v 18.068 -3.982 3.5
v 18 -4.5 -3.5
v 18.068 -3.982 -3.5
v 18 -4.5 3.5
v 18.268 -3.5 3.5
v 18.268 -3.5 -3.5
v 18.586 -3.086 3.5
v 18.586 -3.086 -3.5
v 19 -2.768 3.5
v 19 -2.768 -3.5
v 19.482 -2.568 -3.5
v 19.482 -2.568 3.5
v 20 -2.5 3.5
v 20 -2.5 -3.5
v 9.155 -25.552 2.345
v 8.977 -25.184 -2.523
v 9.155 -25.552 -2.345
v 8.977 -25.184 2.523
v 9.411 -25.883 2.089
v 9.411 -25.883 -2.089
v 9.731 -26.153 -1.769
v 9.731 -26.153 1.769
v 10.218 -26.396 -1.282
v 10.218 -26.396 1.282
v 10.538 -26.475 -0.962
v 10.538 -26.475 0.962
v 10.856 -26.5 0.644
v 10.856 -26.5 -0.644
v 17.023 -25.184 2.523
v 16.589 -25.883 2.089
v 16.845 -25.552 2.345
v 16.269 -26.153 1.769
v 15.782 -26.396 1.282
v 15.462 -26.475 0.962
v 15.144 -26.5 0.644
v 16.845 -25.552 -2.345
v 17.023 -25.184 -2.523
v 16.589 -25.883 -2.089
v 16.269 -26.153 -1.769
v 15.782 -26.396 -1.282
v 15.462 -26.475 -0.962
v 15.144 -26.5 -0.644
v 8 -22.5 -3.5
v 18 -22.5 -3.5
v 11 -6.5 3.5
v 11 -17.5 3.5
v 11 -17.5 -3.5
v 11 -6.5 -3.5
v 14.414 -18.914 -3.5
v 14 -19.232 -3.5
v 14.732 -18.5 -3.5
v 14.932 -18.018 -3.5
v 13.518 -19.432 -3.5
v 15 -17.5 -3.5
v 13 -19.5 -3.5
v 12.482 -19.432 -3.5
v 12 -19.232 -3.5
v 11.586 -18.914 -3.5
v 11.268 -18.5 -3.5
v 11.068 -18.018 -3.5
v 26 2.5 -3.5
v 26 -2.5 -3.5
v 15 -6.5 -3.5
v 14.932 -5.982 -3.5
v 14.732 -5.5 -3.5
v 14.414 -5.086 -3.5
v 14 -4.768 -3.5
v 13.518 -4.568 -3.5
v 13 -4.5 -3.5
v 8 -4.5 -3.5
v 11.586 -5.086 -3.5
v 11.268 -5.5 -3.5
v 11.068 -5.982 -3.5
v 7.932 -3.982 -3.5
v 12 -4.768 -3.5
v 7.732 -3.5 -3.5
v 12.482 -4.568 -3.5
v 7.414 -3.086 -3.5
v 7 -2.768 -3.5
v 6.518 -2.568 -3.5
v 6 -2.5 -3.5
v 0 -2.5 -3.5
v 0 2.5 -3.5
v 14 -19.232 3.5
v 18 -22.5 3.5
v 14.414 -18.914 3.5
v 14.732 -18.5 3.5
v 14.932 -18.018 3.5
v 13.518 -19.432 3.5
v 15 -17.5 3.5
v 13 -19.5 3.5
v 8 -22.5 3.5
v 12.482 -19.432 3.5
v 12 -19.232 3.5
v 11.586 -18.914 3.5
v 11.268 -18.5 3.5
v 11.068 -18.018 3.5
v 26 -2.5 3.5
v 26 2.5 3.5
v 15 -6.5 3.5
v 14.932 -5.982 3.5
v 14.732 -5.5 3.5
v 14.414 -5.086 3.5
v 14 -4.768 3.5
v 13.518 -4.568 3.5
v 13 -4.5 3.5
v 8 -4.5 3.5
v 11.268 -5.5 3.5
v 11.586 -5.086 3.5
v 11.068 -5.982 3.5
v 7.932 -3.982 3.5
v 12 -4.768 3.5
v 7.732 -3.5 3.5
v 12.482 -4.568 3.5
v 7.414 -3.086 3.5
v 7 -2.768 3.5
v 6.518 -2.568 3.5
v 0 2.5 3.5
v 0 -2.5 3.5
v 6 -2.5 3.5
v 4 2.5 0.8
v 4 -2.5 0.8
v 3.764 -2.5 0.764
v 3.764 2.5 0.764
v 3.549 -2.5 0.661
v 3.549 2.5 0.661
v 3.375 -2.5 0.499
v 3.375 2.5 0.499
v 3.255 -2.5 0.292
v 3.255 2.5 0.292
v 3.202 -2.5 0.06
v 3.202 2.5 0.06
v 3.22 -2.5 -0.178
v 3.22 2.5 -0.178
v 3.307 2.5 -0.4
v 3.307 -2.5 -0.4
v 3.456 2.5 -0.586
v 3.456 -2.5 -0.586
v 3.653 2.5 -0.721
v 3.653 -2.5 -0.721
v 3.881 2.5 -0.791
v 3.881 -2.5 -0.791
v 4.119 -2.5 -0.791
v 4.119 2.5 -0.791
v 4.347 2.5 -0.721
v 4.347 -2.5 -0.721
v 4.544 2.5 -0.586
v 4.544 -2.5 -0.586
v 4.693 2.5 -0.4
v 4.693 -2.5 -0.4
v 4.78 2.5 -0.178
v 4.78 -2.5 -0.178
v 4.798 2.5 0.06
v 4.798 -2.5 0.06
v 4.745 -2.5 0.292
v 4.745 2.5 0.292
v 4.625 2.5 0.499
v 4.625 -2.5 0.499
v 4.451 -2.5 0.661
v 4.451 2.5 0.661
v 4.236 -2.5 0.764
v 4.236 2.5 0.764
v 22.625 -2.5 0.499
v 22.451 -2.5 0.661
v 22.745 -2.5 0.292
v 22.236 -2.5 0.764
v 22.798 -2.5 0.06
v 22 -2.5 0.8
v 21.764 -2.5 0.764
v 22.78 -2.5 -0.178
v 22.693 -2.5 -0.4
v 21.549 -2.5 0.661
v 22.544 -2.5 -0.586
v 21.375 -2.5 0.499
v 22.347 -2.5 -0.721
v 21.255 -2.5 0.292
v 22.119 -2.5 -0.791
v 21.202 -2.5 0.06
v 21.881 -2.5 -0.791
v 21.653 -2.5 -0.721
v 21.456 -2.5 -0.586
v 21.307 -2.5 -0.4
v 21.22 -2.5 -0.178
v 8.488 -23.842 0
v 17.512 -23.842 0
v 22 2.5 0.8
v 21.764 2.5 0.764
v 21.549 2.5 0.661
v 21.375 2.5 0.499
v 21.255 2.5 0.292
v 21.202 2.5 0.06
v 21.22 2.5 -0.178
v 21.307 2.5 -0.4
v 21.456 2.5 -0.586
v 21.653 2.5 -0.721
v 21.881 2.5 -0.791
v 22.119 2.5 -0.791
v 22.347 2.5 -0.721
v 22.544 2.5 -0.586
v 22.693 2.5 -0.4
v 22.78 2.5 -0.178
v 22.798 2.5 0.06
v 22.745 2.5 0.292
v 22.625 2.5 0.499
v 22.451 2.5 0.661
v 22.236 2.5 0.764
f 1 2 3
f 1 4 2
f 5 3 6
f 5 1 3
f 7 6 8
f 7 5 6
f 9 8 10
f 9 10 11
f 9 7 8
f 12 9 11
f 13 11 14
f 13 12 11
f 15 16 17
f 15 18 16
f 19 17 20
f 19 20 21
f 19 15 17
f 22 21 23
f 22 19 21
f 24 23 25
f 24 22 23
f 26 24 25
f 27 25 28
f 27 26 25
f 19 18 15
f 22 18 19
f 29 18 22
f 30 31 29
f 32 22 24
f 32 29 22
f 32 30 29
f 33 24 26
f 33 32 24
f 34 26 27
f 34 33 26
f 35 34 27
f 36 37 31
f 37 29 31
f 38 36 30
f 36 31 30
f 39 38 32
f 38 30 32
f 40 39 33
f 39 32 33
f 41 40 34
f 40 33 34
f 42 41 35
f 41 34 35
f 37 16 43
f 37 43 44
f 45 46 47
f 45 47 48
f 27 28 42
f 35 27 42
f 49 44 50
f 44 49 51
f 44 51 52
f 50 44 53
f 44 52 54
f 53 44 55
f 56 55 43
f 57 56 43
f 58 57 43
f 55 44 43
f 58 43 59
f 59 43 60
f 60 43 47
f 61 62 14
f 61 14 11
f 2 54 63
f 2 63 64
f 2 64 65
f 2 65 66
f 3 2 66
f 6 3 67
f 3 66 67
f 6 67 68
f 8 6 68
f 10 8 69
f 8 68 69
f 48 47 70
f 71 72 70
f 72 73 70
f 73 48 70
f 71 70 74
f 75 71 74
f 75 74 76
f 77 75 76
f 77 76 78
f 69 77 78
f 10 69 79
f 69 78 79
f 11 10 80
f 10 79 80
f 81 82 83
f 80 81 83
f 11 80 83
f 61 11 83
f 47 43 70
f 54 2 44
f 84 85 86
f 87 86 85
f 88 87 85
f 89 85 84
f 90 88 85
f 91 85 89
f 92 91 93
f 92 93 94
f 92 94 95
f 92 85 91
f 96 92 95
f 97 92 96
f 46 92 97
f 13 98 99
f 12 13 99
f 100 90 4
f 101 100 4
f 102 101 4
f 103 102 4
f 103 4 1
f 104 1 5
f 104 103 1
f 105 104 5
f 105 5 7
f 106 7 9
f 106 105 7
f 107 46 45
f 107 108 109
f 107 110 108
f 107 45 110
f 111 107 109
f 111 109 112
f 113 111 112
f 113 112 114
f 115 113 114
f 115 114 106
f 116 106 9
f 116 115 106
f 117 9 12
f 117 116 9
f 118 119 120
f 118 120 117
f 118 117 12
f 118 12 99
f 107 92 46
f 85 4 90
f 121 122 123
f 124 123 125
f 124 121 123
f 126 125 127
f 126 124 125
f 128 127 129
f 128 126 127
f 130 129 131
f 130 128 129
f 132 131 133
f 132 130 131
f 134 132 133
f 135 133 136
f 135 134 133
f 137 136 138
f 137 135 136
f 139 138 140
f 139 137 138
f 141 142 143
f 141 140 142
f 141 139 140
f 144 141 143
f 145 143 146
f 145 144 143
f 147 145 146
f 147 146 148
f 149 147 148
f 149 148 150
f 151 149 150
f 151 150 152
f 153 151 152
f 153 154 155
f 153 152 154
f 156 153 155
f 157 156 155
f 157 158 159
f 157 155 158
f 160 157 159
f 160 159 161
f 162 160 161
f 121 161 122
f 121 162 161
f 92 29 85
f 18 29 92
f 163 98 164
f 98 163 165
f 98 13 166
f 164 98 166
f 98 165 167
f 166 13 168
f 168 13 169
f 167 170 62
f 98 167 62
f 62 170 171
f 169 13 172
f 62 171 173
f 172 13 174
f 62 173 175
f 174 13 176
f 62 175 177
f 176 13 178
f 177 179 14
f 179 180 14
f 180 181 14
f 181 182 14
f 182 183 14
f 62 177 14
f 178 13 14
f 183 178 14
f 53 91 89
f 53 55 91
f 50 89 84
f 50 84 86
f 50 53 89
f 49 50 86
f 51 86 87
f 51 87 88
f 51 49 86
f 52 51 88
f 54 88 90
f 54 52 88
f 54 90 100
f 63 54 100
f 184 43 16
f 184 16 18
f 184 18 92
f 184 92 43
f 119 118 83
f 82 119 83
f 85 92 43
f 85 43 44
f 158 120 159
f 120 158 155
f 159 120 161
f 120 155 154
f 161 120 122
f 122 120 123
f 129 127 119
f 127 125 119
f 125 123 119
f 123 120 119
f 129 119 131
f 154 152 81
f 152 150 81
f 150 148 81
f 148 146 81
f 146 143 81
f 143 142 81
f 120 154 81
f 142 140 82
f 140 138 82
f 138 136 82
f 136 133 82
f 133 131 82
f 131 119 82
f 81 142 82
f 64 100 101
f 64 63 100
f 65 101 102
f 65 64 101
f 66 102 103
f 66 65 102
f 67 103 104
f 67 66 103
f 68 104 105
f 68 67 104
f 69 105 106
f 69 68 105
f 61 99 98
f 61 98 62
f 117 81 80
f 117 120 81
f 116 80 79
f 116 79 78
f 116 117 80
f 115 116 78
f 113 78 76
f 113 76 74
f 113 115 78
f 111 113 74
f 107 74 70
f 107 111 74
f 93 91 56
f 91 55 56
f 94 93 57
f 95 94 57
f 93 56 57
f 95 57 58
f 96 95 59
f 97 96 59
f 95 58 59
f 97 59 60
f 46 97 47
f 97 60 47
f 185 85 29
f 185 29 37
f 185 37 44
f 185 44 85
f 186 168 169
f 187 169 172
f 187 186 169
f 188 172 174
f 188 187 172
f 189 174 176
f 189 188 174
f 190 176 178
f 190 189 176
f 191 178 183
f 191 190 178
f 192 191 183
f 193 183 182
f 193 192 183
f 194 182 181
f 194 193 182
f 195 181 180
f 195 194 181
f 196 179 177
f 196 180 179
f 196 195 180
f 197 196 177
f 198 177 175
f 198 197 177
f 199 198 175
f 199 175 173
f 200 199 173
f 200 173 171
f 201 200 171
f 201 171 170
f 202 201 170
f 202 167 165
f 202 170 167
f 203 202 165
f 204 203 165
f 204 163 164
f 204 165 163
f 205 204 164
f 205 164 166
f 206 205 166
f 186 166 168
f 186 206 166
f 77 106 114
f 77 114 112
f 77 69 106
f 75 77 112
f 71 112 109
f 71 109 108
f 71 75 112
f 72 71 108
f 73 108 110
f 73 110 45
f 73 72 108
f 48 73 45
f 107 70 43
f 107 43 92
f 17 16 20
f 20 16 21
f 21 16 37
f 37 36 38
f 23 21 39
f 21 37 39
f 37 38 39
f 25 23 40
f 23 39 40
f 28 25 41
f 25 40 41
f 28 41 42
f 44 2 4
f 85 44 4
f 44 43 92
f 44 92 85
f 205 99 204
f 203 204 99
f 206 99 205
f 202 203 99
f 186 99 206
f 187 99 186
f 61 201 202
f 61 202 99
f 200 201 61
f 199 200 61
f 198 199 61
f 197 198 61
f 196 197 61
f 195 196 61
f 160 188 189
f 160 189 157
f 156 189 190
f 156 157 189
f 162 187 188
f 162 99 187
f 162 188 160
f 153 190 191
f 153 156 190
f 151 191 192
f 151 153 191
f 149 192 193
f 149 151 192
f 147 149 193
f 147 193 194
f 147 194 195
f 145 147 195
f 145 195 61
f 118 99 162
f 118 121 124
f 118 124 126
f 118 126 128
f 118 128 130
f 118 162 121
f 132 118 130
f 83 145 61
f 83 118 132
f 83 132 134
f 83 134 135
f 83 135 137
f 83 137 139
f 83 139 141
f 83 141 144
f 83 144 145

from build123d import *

# Parameters (mm, degrees)
SKETCH1_W           = 7
SKETCH1_H           = 5
BOSS_EXTRUDE1_DEPTH = 26
SKETCH3_R           = 0.8
CUT_EXTRUDE1_DEPTH  = 7
SKETCH4_W           = 10
SKETCH4_H           = 7
BOSS_EXTRUDE2_DEPTH = 20
SKETCH5_W           = 4
SKETCH5_H           = 15
CUT_EXTRUDE2_DEPTH  = 20
SKETCH6_W           = 10
SKETCH6_H           = 7
BOSS_EXTRUDE3_DEPTH = 4
BOSS_EXTRUDE3_TAPER = 20
FILLET2_R           = 2
FILLET5_R           = 2
FILLET8_R           = 2


with BuildPart() as part:
    # Sketch1 → Boss-Extrude1 (new body)
    with BuildSketch(Plane(origin=(0, 0, 0), x_dir=(0, 0, -1), z_dir=(1, 0, 0))):
        Rectangle(SKETCH1_W, SKETCH1_H)
    extrude(amount=BOSS_EXTRUDE1_DEPTH)

    # Sketch3 → Cut-Extrude1 (cut)
    with BuildSketch(Plane(origin=(0, 2.5, -8.047205284), x_dir=(1, 0, 0), z_dir=(0, -1, 0))):
        with Locations(Location((4, 8.047205284, 0), (0, 0, 90))):
            Circle(SKETCH3_R)
        with Locations(Location((22, 8.047205284, 0), (0, 0, 90))):
            Circle(SKETCH3_R)
    extrude(amount=CUT_EXTRUDE1_DEPTH, mode=Mode.SUBTRACT)

    # Sketch4 → Boss-Extrude2 (add)
    with BuildSketch(Plane.XZ.offset(2.5)):
        with Locations((13, 0)):
            Rectangle(SKETCH4_W, SKETCH4_H)
    extrude(amount=BOSS_EXTRUDE2_DEPTH)

    # Sketch5 → Cut-Extrude2 (cut)
    with BuildSketch(Plane.XY.offset(3.5)):
        with Locations((13, -12)):
            Rectangle(SKETCH5_W, SKETCH5_H)
    extrude(amount=-CUT_EXTRUDE2_DEPTH, mode=Mode.SUBTRACT)

    # Fillet2
    fillet2_edges = [part.edges().sort_by_distance(p)[0] for p in [
        (15, -4.5, 0),
        (11, -4.5, 0),
        (15, -19.5, 0),
        (11, -19.5, 0),
    ]]
    fillet(fillet2_edges, radius=FILLET2_R - 0.0001)  # a hair under: the kernel refuses the full size

    # Fillet5
    fillet5_edges = [part.edges().sort_by_distance(p)[0] for p in [
        (8, -2.5, 0),
        (18, -2.5, 0),
    ]]
    fillet(fillet5_edges, radius=FILLET5_R)


with BuildPart() as body_2:
    # Sketch6 → Boss-Extrude3 (new body)
    with BuildSketch(Plane.XZ.offset(22.5)):
        with Locations((13, 0)):
            Rectangle(SKETCH6_W, SKETCH6_H)
    extrude(amount=BOSS_EXTRUDE3_DEPTH, taper=BOSS_EXTRUDE3_TAPER)

    # Fillet8
    fillet8_edges = [body_2.edges().sort_by_distance(p)[0] for p in [
        (9.455880937, -26.5, 0),
        (13, -26.5, -2.044119063),
        (16.544119063, -26.5, 0),
        (13, -26.5, 2.044119063),
    ]]
    fillet(fillet8_edges, radius=FILLET8_R)


solid = Compound([part.part, body_2.part])
